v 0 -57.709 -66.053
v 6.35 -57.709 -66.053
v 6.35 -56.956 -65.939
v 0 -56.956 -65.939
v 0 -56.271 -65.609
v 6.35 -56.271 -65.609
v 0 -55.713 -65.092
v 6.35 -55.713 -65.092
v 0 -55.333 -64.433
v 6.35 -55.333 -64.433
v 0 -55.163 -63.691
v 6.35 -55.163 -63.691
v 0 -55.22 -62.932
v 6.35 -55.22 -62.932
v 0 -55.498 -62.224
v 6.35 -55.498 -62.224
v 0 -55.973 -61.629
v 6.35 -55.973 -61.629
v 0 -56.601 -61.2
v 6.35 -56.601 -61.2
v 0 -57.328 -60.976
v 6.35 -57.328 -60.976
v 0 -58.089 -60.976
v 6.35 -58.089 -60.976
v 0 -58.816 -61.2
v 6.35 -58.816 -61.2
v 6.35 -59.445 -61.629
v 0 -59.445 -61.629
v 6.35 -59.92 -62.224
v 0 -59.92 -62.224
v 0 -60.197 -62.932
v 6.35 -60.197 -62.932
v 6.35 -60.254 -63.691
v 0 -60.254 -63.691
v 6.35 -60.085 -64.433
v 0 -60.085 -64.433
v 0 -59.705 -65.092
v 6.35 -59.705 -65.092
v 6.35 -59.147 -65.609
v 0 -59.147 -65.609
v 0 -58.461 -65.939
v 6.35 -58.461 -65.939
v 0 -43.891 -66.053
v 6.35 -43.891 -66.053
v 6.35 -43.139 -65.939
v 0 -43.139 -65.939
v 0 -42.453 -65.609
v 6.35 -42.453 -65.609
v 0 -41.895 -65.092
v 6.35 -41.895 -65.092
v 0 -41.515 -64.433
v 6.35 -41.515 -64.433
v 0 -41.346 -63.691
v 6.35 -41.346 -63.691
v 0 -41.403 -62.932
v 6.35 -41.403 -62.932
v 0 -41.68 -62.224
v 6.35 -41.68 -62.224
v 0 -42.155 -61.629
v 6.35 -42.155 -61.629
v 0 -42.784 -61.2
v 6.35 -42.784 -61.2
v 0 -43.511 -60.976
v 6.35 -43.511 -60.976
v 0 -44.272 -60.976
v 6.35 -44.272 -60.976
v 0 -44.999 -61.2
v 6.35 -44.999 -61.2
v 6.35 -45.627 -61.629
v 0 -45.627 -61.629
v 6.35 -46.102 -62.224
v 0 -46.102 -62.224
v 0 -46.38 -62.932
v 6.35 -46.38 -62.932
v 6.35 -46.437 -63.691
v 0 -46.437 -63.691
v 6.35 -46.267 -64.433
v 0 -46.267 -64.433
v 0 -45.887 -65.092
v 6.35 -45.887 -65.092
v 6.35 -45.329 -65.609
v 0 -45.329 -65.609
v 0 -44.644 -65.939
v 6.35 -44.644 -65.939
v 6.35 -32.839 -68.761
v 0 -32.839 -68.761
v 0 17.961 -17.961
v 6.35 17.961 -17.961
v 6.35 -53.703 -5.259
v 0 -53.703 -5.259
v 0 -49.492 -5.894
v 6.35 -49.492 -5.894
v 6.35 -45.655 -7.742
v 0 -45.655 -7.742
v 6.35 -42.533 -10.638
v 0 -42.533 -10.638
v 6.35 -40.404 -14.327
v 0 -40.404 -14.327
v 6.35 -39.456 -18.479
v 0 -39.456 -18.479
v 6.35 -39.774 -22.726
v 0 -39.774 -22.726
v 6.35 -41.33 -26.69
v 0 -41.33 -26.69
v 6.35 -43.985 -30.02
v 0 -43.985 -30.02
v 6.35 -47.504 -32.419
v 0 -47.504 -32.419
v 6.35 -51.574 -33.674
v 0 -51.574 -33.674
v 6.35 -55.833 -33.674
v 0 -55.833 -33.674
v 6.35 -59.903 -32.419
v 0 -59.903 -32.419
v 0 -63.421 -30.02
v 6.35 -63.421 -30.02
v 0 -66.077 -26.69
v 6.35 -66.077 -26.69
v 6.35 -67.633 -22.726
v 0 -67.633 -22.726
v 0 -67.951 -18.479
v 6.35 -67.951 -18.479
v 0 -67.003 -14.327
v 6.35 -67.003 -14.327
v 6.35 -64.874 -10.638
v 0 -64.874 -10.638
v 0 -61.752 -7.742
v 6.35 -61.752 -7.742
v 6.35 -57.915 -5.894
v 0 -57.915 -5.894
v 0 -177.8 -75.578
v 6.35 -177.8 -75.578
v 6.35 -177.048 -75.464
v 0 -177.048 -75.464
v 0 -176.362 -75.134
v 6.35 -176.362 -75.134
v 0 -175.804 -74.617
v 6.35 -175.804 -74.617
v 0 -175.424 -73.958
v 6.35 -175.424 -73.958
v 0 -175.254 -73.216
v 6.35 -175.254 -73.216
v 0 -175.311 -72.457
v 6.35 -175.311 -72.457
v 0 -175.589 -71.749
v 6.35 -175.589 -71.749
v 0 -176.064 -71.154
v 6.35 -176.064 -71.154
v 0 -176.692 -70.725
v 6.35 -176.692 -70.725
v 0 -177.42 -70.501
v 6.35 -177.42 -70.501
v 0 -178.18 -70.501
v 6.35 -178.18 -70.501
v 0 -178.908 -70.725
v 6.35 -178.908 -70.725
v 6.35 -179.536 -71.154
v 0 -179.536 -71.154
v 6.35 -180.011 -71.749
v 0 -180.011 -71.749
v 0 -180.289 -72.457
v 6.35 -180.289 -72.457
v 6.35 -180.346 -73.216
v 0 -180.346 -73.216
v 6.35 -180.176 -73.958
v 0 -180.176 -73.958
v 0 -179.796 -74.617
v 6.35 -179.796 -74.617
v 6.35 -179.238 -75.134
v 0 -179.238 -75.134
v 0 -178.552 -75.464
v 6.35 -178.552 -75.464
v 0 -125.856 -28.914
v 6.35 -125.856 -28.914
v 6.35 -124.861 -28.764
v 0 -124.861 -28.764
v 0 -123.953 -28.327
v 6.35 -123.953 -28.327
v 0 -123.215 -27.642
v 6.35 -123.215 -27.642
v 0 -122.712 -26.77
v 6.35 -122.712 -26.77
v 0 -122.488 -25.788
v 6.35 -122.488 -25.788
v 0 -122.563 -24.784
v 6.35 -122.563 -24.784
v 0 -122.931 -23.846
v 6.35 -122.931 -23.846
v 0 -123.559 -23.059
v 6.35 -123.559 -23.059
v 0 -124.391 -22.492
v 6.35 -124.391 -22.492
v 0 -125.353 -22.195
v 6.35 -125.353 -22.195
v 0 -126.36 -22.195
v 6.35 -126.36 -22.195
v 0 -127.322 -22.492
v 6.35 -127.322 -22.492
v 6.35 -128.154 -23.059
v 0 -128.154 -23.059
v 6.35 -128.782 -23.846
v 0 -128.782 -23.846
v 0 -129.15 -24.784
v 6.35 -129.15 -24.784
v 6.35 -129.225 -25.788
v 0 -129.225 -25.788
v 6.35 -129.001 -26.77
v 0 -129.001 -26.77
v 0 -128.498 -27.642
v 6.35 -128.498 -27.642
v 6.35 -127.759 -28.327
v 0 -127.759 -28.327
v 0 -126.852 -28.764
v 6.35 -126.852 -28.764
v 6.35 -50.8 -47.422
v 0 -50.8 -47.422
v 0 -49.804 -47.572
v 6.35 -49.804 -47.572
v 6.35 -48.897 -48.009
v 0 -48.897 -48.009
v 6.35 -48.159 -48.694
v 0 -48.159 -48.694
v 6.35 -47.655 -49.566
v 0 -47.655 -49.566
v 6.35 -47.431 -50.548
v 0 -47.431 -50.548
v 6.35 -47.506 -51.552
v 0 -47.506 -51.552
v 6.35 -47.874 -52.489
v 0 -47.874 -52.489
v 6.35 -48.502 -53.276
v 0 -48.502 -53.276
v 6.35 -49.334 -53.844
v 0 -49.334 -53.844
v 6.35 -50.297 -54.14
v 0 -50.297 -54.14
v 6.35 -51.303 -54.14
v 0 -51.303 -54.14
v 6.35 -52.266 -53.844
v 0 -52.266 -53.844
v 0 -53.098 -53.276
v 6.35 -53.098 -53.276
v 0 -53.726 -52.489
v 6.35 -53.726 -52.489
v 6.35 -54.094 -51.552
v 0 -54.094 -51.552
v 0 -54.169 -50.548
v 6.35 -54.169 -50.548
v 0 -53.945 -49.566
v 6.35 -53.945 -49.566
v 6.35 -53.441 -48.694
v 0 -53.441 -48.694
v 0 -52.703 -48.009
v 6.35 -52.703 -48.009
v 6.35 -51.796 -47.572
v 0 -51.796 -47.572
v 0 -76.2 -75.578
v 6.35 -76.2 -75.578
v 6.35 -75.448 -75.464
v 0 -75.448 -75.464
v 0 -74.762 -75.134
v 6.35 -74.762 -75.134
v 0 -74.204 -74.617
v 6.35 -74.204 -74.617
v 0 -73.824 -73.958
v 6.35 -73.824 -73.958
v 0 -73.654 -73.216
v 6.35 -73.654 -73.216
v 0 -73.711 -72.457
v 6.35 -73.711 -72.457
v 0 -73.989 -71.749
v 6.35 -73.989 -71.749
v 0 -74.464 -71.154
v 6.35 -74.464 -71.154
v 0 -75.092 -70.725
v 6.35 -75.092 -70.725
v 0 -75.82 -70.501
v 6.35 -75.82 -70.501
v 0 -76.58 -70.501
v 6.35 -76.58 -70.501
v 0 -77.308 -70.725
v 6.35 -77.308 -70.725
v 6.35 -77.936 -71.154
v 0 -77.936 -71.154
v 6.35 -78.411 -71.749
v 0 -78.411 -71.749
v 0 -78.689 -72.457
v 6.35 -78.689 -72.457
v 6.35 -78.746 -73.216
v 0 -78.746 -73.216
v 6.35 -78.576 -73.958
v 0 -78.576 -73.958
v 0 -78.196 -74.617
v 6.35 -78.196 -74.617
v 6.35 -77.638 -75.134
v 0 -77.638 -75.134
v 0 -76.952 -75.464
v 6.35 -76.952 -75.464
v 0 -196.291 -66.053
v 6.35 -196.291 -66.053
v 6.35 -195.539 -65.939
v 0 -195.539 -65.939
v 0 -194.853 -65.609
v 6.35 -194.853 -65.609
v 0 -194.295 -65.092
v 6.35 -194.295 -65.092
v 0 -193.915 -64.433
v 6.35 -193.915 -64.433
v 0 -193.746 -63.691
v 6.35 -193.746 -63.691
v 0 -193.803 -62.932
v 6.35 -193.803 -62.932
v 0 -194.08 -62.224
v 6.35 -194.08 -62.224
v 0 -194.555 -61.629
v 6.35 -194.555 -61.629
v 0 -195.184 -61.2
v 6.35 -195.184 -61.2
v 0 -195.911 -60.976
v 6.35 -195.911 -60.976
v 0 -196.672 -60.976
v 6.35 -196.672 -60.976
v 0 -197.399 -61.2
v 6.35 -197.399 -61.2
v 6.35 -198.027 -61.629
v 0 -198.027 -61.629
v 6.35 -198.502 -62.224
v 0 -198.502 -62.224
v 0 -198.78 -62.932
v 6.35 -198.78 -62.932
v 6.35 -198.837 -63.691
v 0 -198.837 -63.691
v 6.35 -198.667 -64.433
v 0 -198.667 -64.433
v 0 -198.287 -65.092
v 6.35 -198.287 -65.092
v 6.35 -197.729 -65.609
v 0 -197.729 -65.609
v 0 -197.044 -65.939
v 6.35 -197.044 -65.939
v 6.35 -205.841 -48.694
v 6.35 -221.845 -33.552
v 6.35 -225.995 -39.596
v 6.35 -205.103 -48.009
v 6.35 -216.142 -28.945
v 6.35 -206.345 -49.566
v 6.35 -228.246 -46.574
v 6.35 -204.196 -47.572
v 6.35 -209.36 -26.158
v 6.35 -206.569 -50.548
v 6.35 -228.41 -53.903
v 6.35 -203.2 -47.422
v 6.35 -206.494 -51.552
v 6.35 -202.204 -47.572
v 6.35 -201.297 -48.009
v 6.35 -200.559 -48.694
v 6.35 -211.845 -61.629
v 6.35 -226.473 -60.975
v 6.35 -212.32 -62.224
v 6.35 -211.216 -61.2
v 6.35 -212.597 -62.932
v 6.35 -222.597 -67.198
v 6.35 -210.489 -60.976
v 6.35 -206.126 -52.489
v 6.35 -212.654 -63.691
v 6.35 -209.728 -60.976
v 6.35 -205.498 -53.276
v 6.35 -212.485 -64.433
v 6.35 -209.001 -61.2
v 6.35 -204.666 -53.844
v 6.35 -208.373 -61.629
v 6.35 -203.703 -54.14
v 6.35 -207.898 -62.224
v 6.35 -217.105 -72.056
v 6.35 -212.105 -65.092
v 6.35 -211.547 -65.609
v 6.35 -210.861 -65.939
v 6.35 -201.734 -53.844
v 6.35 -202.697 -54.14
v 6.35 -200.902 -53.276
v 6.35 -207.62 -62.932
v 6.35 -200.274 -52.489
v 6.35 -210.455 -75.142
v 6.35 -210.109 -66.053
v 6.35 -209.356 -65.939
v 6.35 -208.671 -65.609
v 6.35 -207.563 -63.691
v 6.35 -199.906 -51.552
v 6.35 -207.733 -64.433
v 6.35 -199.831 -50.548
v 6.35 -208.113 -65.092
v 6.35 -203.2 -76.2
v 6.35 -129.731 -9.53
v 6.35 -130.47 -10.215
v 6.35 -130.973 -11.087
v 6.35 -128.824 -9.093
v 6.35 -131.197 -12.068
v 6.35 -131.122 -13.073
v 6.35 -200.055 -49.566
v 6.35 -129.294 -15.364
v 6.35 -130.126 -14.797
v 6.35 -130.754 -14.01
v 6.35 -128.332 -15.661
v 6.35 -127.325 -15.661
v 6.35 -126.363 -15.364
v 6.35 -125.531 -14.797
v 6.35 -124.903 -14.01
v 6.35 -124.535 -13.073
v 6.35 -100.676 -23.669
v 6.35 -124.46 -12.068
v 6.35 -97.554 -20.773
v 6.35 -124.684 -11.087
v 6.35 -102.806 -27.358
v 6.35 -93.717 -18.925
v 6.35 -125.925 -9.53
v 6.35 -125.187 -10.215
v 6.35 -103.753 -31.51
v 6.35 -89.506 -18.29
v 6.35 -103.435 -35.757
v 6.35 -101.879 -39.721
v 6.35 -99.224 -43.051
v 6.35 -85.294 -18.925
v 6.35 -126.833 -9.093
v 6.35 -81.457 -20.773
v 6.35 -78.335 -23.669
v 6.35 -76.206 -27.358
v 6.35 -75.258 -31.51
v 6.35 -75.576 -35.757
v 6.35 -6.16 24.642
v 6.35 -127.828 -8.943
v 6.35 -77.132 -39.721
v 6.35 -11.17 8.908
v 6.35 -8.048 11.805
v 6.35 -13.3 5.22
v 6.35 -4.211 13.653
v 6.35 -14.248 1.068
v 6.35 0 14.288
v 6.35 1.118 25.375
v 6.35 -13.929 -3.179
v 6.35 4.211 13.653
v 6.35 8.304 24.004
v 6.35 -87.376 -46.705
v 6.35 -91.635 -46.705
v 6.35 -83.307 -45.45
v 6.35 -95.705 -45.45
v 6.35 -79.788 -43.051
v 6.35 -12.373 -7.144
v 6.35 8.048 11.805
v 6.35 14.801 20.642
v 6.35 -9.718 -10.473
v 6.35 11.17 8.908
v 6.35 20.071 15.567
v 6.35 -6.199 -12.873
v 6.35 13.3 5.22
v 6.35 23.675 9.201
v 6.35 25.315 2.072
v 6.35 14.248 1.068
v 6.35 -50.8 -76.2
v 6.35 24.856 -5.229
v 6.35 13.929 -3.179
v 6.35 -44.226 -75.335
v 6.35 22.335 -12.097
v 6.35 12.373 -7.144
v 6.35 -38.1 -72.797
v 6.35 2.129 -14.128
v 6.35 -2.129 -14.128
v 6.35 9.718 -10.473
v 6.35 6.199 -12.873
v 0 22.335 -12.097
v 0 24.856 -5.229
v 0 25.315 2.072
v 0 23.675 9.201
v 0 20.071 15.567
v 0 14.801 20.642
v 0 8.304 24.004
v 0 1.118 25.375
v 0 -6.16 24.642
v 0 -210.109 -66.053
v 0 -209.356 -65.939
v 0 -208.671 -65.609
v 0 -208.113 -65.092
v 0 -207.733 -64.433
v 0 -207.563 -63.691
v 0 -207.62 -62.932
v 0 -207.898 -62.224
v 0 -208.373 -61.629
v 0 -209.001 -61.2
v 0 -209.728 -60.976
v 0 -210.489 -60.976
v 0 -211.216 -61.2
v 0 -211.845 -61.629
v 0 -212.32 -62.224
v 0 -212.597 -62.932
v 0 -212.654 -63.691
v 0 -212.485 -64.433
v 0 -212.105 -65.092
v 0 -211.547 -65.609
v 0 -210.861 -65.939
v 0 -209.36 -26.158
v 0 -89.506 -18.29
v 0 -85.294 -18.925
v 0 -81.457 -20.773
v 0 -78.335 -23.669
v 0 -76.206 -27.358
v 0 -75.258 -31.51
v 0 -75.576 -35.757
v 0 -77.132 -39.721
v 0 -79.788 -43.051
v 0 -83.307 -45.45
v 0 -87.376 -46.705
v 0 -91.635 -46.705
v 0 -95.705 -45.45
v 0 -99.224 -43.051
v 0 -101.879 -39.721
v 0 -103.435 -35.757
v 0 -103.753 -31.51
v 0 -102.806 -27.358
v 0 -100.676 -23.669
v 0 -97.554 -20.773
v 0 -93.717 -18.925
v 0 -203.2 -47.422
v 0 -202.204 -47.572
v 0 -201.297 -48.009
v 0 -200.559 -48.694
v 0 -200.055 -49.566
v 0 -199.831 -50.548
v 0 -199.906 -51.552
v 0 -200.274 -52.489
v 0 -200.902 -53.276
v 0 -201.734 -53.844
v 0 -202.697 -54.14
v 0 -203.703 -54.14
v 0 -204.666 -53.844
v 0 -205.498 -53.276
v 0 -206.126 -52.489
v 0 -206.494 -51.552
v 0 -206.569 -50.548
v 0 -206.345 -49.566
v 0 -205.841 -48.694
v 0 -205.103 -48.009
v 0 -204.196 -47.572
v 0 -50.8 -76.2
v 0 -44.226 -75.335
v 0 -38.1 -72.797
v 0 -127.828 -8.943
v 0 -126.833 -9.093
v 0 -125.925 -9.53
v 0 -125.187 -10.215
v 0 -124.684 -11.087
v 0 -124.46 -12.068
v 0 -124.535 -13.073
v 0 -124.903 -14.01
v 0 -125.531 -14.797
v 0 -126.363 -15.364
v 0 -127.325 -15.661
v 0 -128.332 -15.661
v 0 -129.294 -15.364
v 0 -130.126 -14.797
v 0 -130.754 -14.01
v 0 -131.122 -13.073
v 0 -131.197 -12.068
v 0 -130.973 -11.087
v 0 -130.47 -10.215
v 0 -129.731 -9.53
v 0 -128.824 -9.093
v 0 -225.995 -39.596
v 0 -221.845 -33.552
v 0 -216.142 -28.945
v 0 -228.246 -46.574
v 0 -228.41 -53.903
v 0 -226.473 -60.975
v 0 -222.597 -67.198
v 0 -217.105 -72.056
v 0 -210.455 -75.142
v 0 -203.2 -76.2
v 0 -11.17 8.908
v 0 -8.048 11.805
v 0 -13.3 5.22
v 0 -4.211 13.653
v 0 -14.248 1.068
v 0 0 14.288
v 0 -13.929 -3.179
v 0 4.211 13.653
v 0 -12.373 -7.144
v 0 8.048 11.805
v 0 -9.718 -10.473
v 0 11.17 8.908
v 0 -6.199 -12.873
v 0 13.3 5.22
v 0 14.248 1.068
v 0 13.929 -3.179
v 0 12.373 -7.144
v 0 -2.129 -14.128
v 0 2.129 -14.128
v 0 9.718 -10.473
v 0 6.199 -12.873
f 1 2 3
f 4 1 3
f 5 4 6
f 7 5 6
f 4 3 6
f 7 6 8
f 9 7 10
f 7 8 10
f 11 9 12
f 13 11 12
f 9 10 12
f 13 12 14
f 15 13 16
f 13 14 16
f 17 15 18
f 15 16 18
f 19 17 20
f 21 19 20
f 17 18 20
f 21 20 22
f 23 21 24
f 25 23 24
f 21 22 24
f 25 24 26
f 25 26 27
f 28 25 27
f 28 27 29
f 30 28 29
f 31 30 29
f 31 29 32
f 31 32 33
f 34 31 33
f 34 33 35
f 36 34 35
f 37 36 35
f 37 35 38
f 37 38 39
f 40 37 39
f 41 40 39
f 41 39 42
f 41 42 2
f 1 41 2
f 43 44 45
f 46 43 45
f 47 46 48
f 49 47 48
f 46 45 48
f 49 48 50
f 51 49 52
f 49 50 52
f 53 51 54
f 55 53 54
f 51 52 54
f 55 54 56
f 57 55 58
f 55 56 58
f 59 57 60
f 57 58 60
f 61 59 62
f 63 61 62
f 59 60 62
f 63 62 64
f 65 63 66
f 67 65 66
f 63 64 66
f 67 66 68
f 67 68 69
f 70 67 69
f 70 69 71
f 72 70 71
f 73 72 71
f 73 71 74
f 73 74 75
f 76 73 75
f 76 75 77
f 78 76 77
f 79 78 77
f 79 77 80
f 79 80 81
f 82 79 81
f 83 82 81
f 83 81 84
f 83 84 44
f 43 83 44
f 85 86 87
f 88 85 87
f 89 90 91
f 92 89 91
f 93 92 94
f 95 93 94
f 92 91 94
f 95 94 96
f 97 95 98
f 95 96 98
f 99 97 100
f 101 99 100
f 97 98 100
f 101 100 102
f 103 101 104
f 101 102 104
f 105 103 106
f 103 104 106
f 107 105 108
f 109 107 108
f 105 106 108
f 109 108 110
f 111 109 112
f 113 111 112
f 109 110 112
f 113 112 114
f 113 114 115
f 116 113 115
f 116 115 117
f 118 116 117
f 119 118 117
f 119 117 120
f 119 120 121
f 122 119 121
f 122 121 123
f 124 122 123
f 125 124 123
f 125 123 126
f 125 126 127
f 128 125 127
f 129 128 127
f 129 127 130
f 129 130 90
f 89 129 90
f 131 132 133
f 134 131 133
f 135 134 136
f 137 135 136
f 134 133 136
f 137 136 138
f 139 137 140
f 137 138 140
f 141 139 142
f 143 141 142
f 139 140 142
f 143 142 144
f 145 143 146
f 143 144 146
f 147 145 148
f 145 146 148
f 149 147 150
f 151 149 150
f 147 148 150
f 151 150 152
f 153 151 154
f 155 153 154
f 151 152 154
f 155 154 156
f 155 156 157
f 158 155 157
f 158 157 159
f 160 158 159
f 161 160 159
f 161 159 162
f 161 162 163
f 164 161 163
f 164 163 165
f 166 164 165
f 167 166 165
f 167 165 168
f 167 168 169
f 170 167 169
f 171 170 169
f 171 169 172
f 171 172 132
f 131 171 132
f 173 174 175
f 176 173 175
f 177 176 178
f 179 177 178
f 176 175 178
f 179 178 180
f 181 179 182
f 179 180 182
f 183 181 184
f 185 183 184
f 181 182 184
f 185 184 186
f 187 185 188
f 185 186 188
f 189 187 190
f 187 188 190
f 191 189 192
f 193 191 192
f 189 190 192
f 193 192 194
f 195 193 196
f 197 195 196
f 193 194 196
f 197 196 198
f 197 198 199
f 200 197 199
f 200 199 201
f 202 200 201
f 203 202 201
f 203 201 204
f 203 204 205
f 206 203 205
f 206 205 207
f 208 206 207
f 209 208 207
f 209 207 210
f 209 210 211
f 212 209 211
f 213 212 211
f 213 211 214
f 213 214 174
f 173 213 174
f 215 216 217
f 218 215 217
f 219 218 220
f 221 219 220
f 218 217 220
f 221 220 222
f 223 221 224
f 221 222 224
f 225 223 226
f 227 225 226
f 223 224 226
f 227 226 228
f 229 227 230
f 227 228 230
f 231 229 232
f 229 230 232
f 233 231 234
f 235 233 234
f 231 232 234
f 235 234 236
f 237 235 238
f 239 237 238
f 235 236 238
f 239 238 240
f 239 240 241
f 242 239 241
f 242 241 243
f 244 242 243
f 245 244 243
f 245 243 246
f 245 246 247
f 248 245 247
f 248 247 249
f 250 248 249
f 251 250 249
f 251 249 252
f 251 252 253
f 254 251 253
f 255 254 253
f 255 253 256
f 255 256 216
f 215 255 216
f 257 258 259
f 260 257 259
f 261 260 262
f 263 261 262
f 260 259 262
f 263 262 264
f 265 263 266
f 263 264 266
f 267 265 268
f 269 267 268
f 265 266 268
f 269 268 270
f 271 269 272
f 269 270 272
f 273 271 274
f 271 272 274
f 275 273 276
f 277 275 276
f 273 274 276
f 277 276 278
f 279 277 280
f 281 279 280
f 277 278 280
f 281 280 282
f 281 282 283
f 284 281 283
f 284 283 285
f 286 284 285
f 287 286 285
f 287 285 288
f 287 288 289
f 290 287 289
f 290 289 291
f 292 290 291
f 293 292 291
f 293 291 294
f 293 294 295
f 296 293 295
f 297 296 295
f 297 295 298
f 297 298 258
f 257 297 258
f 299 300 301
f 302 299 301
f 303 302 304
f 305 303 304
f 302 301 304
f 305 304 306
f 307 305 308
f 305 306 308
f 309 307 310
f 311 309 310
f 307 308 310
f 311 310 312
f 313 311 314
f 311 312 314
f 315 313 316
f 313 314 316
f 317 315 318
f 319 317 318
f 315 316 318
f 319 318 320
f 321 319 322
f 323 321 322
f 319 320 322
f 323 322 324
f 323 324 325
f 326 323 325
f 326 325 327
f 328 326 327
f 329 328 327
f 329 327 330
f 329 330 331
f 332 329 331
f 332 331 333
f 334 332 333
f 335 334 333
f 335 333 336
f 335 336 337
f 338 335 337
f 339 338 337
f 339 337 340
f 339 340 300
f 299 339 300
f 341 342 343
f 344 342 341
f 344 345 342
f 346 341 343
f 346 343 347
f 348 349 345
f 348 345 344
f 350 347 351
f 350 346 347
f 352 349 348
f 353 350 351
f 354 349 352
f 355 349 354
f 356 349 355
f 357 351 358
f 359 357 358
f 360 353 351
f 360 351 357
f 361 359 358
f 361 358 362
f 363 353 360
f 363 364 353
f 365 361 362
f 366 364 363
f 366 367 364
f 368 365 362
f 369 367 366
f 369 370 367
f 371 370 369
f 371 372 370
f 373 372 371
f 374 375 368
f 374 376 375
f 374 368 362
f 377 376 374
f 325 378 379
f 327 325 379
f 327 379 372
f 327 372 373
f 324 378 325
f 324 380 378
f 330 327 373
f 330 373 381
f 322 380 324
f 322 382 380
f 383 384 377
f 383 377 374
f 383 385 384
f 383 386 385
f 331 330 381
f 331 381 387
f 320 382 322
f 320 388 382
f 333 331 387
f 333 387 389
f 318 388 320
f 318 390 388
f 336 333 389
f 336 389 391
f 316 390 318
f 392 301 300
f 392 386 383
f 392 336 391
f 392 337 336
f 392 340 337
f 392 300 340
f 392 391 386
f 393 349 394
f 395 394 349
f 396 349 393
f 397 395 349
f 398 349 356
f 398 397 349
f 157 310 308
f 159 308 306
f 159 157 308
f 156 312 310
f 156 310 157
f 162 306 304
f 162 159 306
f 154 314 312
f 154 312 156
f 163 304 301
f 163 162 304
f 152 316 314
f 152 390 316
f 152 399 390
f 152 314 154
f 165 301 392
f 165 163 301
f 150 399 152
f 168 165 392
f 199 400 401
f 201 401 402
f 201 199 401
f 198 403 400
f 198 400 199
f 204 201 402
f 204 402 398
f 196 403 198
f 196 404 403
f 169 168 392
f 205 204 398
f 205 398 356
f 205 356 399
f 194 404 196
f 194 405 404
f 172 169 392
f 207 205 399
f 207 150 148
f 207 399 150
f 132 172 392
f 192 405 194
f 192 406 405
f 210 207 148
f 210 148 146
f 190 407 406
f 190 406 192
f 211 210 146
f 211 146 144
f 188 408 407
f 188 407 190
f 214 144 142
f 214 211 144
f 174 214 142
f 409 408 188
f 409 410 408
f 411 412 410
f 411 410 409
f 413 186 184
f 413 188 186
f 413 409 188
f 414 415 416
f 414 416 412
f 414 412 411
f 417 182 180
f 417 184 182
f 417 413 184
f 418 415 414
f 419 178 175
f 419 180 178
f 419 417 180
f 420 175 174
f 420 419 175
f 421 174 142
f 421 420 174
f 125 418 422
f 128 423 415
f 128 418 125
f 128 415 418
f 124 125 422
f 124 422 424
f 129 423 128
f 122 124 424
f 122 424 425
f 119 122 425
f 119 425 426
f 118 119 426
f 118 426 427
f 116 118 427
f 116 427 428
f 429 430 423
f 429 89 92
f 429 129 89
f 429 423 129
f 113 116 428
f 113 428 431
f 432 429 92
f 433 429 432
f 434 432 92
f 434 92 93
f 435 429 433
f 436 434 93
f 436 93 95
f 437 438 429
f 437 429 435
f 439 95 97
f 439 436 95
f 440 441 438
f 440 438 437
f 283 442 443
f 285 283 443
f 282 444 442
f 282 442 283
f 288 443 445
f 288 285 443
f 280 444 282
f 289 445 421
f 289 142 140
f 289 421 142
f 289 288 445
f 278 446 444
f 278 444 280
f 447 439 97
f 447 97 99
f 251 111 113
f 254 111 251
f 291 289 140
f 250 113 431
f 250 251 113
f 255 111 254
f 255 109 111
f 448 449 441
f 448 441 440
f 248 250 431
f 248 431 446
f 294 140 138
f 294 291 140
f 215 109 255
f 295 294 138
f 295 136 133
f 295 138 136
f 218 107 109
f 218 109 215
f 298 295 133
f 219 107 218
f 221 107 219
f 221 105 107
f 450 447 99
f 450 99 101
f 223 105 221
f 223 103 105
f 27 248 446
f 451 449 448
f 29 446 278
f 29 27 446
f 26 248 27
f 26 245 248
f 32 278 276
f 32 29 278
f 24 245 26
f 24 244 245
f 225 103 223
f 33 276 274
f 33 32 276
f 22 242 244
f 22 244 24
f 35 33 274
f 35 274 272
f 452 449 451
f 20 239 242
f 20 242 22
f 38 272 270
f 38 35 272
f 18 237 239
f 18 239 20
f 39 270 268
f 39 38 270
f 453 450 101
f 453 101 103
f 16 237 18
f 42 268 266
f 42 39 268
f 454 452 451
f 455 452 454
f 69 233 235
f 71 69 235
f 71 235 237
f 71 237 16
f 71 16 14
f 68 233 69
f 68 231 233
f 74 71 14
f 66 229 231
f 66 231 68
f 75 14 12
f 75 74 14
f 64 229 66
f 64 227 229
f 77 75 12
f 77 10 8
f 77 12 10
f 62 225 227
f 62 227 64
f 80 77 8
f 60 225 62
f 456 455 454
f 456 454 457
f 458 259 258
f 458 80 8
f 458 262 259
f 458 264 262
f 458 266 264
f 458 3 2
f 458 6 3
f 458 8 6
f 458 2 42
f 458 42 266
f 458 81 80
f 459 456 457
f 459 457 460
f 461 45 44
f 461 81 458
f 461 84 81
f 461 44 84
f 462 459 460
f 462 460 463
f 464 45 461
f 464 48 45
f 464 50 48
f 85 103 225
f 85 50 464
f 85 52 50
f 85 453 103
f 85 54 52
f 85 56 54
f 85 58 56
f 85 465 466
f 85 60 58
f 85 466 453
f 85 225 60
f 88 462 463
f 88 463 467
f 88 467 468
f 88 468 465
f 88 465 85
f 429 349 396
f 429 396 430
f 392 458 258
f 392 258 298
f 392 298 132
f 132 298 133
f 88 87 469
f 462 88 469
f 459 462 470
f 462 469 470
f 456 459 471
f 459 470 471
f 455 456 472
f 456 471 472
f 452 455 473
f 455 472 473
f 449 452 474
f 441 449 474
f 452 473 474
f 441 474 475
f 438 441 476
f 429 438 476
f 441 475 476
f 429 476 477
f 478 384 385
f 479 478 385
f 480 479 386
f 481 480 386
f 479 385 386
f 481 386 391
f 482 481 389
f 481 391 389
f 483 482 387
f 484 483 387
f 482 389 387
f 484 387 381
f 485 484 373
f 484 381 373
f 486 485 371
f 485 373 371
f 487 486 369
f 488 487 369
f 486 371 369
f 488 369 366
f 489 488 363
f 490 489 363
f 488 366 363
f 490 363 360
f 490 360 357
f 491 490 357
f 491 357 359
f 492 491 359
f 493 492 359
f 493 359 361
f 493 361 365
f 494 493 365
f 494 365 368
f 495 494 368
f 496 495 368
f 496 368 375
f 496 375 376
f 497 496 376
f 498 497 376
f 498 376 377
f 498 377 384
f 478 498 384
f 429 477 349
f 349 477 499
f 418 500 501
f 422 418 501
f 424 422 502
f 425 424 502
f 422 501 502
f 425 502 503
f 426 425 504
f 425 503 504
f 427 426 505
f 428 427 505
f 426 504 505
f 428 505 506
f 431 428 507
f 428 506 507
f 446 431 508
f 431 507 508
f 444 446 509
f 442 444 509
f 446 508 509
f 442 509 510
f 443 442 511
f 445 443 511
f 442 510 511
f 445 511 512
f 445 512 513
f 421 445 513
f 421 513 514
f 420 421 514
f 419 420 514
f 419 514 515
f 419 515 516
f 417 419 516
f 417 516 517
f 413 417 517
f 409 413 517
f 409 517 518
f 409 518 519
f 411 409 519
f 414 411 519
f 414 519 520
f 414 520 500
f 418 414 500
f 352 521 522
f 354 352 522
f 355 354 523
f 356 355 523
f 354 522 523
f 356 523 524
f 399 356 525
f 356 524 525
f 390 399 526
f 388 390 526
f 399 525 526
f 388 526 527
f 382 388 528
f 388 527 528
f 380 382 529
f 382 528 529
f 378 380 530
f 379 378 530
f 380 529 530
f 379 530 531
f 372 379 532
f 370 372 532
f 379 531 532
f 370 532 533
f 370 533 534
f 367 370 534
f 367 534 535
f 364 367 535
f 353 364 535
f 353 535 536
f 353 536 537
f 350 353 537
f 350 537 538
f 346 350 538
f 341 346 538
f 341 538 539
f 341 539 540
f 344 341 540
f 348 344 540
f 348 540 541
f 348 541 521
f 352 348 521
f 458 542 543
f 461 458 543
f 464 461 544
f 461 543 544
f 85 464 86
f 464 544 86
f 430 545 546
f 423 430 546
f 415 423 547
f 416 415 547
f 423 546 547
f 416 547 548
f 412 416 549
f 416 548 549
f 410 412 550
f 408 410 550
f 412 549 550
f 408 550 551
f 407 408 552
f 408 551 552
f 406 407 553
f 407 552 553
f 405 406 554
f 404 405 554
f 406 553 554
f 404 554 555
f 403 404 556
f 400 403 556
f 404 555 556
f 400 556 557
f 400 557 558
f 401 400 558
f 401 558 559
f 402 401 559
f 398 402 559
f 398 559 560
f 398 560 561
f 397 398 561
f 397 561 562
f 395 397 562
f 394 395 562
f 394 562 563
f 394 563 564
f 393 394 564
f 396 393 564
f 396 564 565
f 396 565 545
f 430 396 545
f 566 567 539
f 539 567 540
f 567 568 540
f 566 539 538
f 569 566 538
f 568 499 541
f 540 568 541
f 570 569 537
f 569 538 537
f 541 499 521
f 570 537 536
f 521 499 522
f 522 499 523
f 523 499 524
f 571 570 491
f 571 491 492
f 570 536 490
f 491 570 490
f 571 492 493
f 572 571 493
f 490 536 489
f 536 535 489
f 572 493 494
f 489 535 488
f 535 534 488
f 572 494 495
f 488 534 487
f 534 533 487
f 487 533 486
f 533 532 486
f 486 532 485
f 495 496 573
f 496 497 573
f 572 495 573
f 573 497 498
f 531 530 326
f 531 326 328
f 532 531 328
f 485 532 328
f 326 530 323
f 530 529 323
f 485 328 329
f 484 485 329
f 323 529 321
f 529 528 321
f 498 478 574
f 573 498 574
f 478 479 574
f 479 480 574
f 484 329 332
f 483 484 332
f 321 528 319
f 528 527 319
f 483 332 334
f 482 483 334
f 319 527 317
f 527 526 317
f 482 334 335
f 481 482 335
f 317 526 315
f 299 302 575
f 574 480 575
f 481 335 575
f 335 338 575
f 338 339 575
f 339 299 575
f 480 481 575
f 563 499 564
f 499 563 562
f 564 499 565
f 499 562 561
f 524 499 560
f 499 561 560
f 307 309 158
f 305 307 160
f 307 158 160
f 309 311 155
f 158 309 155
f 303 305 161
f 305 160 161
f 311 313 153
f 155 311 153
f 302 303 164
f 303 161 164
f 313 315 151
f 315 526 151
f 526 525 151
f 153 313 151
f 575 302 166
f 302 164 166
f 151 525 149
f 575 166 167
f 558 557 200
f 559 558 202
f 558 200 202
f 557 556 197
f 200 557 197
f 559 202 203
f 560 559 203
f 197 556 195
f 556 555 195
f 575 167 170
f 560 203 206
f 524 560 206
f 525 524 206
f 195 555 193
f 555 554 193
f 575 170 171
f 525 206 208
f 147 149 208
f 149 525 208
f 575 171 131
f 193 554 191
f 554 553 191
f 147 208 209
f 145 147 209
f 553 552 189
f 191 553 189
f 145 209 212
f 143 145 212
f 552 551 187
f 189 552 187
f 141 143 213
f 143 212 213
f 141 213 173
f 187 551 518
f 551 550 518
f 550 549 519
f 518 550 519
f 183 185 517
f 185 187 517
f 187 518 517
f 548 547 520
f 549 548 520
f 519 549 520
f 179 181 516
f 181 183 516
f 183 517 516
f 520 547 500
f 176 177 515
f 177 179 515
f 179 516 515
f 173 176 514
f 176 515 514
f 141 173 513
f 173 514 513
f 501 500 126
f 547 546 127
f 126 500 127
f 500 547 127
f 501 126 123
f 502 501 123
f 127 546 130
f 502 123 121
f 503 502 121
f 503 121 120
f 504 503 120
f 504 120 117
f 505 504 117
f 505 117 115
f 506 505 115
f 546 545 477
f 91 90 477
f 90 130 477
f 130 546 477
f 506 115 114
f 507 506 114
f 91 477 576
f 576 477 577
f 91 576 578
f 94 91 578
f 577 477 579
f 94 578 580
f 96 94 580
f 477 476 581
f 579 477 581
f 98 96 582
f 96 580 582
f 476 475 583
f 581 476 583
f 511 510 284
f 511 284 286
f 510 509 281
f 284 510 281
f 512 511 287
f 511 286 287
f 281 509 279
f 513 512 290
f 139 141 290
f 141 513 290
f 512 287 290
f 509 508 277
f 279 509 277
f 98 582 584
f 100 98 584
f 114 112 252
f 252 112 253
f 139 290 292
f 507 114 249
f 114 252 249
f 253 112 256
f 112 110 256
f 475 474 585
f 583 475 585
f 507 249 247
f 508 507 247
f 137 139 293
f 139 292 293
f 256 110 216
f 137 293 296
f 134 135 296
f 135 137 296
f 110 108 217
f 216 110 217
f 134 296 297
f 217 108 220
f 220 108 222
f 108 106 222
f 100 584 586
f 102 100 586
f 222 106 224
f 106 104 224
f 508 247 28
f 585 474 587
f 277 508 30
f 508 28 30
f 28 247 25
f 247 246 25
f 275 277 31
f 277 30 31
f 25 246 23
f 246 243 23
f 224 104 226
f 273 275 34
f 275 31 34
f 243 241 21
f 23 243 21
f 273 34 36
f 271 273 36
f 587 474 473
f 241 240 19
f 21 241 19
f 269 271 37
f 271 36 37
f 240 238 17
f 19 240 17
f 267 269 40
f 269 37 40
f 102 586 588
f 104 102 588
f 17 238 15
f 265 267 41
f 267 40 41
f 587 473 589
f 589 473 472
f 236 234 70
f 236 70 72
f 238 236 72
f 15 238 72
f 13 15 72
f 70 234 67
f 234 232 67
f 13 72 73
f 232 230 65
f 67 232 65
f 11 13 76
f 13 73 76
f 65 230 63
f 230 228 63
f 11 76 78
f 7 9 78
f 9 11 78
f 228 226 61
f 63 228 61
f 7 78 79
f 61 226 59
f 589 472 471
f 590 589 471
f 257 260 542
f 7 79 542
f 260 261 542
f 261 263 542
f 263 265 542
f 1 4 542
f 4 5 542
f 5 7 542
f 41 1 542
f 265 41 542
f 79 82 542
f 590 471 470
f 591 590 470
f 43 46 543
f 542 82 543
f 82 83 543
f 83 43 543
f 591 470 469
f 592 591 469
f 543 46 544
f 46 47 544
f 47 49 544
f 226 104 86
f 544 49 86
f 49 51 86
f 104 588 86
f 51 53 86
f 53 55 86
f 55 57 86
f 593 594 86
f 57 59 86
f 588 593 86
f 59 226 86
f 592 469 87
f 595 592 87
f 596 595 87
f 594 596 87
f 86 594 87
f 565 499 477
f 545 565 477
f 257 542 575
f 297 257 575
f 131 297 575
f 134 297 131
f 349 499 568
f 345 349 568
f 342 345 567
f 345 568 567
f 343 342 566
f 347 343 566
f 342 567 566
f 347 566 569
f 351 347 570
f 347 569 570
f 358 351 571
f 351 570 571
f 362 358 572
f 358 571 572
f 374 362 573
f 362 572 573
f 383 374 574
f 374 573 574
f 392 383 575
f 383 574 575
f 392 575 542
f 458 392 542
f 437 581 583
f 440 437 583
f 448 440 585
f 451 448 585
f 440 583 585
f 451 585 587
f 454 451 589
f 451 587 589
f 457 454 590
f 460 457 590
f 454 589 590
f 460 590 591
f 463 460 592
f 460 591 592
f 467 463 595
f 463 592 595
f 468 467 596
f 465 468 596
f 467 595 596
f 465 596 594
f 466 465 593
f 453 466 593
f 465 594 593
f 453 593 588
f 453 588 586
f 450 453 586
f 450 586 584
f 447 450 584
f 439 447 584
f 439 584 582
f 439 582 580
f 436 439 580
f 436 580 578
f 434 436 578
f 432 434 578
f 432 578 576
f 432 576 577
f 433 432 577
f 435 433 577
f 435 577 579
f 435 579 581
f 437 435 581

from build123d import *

# Parameters (mm, degrees)
BOSS_EXTRUDE1_DEPTH     = 6.35
F_1_1_DIAMETER_HOLE1_D  = 28.575
F_1_4_CLEARANCE_HOLE1_D = 6.7564
F_1_4_20_TAPPED_HOLE1_D = 5.1054
F_1_4_CLEARANCE_HOLE2_D = 6.7564
F_10_CLEARANCE_HOLE1_D  = 5.1054


with BuildPart() as part:
    # Sketch2 → Boss-Extrude1 (new body)
    with BuildSketch(Plane(origin=(0, 0, 0), x_dir=(0, 0, -1), z_dir=(1, 0, 0))):
        with BuildLine():
            Line((68.760512242, -32.839487758), (17.960512242, 17.960512242))
            ThreePointArc((17.960512242, 17.960512242), (-12.514549901, 22.103077632), (-24.641619504, -6.160404876))
            Line((-24.641619504, -6.160404876), (26.158380496, -209.360404876))
            ThreePointArc((26.158380496, -209.360404876), (53.903454898, -228.40969194), (76.2, -203.2))
            Line((76.2, -203.2), (76.2, -50.8))
            ThreePointArc((76.2, -50.8), (74.266540126, -41.079840818), (68.760512242, -32.839487758))
        make_face()
    extrude(amount=BOSS_EXTRUDE1_DEPTH)

    # 1 (1) Diameter Hole1 (through all)
    with Locations(Plane(origin=(6.35, 0, 0), x_dir=(0, 0, -1), z_dir=(1, 0, 0))):
        with Locations((0, 0), (19.546451191, -53.703433278), (32.577418652, -89.50572213)):
            Hole(F_1_1_DIAMETER_HOLE1_D / 2)

    # 1/4 Clearance Hole1 (through all)
    with Locations(Plane(origin=(6.35, 0, 0), x_dir=(0, 0, -1), z_dir=(1, 0, 0))):
        with Locations((50.8, -50.8), (50.8, -203.2), (12.320809752, -127.828401175)):
            Hole(F_1_4_CLEARANCE_HOLE1_D / 2)

    # 1/4-20 Tapped Hole1 (through all)
    with Locations(Plane.ZY):
        with Locations((-63.5, -57.7088), (-63.5, -43.8912), (-63.5, -210.1088), (-63.5, -196.2912)):
            Hole(F_1_4_20_TAPPED_HOLE1_D / 2)

    # 1/4 Clearance Hole2 (through all)
    with Locations(Plane.ZY):
        with Locations((-25.535413776, -125.85644657)):
            Hole(F_1_4_CLEARANCE_HOLE2_D / 2)

    # #10 Clearance Hole1 (through all)
    with Locations(Plane.ZY):
        with Locations((-73.025, -76.2), (-73.025, -177.8)):
            Hole(F_10_CLEARANCE_HOLE1_D / 2)


solid = part.part
